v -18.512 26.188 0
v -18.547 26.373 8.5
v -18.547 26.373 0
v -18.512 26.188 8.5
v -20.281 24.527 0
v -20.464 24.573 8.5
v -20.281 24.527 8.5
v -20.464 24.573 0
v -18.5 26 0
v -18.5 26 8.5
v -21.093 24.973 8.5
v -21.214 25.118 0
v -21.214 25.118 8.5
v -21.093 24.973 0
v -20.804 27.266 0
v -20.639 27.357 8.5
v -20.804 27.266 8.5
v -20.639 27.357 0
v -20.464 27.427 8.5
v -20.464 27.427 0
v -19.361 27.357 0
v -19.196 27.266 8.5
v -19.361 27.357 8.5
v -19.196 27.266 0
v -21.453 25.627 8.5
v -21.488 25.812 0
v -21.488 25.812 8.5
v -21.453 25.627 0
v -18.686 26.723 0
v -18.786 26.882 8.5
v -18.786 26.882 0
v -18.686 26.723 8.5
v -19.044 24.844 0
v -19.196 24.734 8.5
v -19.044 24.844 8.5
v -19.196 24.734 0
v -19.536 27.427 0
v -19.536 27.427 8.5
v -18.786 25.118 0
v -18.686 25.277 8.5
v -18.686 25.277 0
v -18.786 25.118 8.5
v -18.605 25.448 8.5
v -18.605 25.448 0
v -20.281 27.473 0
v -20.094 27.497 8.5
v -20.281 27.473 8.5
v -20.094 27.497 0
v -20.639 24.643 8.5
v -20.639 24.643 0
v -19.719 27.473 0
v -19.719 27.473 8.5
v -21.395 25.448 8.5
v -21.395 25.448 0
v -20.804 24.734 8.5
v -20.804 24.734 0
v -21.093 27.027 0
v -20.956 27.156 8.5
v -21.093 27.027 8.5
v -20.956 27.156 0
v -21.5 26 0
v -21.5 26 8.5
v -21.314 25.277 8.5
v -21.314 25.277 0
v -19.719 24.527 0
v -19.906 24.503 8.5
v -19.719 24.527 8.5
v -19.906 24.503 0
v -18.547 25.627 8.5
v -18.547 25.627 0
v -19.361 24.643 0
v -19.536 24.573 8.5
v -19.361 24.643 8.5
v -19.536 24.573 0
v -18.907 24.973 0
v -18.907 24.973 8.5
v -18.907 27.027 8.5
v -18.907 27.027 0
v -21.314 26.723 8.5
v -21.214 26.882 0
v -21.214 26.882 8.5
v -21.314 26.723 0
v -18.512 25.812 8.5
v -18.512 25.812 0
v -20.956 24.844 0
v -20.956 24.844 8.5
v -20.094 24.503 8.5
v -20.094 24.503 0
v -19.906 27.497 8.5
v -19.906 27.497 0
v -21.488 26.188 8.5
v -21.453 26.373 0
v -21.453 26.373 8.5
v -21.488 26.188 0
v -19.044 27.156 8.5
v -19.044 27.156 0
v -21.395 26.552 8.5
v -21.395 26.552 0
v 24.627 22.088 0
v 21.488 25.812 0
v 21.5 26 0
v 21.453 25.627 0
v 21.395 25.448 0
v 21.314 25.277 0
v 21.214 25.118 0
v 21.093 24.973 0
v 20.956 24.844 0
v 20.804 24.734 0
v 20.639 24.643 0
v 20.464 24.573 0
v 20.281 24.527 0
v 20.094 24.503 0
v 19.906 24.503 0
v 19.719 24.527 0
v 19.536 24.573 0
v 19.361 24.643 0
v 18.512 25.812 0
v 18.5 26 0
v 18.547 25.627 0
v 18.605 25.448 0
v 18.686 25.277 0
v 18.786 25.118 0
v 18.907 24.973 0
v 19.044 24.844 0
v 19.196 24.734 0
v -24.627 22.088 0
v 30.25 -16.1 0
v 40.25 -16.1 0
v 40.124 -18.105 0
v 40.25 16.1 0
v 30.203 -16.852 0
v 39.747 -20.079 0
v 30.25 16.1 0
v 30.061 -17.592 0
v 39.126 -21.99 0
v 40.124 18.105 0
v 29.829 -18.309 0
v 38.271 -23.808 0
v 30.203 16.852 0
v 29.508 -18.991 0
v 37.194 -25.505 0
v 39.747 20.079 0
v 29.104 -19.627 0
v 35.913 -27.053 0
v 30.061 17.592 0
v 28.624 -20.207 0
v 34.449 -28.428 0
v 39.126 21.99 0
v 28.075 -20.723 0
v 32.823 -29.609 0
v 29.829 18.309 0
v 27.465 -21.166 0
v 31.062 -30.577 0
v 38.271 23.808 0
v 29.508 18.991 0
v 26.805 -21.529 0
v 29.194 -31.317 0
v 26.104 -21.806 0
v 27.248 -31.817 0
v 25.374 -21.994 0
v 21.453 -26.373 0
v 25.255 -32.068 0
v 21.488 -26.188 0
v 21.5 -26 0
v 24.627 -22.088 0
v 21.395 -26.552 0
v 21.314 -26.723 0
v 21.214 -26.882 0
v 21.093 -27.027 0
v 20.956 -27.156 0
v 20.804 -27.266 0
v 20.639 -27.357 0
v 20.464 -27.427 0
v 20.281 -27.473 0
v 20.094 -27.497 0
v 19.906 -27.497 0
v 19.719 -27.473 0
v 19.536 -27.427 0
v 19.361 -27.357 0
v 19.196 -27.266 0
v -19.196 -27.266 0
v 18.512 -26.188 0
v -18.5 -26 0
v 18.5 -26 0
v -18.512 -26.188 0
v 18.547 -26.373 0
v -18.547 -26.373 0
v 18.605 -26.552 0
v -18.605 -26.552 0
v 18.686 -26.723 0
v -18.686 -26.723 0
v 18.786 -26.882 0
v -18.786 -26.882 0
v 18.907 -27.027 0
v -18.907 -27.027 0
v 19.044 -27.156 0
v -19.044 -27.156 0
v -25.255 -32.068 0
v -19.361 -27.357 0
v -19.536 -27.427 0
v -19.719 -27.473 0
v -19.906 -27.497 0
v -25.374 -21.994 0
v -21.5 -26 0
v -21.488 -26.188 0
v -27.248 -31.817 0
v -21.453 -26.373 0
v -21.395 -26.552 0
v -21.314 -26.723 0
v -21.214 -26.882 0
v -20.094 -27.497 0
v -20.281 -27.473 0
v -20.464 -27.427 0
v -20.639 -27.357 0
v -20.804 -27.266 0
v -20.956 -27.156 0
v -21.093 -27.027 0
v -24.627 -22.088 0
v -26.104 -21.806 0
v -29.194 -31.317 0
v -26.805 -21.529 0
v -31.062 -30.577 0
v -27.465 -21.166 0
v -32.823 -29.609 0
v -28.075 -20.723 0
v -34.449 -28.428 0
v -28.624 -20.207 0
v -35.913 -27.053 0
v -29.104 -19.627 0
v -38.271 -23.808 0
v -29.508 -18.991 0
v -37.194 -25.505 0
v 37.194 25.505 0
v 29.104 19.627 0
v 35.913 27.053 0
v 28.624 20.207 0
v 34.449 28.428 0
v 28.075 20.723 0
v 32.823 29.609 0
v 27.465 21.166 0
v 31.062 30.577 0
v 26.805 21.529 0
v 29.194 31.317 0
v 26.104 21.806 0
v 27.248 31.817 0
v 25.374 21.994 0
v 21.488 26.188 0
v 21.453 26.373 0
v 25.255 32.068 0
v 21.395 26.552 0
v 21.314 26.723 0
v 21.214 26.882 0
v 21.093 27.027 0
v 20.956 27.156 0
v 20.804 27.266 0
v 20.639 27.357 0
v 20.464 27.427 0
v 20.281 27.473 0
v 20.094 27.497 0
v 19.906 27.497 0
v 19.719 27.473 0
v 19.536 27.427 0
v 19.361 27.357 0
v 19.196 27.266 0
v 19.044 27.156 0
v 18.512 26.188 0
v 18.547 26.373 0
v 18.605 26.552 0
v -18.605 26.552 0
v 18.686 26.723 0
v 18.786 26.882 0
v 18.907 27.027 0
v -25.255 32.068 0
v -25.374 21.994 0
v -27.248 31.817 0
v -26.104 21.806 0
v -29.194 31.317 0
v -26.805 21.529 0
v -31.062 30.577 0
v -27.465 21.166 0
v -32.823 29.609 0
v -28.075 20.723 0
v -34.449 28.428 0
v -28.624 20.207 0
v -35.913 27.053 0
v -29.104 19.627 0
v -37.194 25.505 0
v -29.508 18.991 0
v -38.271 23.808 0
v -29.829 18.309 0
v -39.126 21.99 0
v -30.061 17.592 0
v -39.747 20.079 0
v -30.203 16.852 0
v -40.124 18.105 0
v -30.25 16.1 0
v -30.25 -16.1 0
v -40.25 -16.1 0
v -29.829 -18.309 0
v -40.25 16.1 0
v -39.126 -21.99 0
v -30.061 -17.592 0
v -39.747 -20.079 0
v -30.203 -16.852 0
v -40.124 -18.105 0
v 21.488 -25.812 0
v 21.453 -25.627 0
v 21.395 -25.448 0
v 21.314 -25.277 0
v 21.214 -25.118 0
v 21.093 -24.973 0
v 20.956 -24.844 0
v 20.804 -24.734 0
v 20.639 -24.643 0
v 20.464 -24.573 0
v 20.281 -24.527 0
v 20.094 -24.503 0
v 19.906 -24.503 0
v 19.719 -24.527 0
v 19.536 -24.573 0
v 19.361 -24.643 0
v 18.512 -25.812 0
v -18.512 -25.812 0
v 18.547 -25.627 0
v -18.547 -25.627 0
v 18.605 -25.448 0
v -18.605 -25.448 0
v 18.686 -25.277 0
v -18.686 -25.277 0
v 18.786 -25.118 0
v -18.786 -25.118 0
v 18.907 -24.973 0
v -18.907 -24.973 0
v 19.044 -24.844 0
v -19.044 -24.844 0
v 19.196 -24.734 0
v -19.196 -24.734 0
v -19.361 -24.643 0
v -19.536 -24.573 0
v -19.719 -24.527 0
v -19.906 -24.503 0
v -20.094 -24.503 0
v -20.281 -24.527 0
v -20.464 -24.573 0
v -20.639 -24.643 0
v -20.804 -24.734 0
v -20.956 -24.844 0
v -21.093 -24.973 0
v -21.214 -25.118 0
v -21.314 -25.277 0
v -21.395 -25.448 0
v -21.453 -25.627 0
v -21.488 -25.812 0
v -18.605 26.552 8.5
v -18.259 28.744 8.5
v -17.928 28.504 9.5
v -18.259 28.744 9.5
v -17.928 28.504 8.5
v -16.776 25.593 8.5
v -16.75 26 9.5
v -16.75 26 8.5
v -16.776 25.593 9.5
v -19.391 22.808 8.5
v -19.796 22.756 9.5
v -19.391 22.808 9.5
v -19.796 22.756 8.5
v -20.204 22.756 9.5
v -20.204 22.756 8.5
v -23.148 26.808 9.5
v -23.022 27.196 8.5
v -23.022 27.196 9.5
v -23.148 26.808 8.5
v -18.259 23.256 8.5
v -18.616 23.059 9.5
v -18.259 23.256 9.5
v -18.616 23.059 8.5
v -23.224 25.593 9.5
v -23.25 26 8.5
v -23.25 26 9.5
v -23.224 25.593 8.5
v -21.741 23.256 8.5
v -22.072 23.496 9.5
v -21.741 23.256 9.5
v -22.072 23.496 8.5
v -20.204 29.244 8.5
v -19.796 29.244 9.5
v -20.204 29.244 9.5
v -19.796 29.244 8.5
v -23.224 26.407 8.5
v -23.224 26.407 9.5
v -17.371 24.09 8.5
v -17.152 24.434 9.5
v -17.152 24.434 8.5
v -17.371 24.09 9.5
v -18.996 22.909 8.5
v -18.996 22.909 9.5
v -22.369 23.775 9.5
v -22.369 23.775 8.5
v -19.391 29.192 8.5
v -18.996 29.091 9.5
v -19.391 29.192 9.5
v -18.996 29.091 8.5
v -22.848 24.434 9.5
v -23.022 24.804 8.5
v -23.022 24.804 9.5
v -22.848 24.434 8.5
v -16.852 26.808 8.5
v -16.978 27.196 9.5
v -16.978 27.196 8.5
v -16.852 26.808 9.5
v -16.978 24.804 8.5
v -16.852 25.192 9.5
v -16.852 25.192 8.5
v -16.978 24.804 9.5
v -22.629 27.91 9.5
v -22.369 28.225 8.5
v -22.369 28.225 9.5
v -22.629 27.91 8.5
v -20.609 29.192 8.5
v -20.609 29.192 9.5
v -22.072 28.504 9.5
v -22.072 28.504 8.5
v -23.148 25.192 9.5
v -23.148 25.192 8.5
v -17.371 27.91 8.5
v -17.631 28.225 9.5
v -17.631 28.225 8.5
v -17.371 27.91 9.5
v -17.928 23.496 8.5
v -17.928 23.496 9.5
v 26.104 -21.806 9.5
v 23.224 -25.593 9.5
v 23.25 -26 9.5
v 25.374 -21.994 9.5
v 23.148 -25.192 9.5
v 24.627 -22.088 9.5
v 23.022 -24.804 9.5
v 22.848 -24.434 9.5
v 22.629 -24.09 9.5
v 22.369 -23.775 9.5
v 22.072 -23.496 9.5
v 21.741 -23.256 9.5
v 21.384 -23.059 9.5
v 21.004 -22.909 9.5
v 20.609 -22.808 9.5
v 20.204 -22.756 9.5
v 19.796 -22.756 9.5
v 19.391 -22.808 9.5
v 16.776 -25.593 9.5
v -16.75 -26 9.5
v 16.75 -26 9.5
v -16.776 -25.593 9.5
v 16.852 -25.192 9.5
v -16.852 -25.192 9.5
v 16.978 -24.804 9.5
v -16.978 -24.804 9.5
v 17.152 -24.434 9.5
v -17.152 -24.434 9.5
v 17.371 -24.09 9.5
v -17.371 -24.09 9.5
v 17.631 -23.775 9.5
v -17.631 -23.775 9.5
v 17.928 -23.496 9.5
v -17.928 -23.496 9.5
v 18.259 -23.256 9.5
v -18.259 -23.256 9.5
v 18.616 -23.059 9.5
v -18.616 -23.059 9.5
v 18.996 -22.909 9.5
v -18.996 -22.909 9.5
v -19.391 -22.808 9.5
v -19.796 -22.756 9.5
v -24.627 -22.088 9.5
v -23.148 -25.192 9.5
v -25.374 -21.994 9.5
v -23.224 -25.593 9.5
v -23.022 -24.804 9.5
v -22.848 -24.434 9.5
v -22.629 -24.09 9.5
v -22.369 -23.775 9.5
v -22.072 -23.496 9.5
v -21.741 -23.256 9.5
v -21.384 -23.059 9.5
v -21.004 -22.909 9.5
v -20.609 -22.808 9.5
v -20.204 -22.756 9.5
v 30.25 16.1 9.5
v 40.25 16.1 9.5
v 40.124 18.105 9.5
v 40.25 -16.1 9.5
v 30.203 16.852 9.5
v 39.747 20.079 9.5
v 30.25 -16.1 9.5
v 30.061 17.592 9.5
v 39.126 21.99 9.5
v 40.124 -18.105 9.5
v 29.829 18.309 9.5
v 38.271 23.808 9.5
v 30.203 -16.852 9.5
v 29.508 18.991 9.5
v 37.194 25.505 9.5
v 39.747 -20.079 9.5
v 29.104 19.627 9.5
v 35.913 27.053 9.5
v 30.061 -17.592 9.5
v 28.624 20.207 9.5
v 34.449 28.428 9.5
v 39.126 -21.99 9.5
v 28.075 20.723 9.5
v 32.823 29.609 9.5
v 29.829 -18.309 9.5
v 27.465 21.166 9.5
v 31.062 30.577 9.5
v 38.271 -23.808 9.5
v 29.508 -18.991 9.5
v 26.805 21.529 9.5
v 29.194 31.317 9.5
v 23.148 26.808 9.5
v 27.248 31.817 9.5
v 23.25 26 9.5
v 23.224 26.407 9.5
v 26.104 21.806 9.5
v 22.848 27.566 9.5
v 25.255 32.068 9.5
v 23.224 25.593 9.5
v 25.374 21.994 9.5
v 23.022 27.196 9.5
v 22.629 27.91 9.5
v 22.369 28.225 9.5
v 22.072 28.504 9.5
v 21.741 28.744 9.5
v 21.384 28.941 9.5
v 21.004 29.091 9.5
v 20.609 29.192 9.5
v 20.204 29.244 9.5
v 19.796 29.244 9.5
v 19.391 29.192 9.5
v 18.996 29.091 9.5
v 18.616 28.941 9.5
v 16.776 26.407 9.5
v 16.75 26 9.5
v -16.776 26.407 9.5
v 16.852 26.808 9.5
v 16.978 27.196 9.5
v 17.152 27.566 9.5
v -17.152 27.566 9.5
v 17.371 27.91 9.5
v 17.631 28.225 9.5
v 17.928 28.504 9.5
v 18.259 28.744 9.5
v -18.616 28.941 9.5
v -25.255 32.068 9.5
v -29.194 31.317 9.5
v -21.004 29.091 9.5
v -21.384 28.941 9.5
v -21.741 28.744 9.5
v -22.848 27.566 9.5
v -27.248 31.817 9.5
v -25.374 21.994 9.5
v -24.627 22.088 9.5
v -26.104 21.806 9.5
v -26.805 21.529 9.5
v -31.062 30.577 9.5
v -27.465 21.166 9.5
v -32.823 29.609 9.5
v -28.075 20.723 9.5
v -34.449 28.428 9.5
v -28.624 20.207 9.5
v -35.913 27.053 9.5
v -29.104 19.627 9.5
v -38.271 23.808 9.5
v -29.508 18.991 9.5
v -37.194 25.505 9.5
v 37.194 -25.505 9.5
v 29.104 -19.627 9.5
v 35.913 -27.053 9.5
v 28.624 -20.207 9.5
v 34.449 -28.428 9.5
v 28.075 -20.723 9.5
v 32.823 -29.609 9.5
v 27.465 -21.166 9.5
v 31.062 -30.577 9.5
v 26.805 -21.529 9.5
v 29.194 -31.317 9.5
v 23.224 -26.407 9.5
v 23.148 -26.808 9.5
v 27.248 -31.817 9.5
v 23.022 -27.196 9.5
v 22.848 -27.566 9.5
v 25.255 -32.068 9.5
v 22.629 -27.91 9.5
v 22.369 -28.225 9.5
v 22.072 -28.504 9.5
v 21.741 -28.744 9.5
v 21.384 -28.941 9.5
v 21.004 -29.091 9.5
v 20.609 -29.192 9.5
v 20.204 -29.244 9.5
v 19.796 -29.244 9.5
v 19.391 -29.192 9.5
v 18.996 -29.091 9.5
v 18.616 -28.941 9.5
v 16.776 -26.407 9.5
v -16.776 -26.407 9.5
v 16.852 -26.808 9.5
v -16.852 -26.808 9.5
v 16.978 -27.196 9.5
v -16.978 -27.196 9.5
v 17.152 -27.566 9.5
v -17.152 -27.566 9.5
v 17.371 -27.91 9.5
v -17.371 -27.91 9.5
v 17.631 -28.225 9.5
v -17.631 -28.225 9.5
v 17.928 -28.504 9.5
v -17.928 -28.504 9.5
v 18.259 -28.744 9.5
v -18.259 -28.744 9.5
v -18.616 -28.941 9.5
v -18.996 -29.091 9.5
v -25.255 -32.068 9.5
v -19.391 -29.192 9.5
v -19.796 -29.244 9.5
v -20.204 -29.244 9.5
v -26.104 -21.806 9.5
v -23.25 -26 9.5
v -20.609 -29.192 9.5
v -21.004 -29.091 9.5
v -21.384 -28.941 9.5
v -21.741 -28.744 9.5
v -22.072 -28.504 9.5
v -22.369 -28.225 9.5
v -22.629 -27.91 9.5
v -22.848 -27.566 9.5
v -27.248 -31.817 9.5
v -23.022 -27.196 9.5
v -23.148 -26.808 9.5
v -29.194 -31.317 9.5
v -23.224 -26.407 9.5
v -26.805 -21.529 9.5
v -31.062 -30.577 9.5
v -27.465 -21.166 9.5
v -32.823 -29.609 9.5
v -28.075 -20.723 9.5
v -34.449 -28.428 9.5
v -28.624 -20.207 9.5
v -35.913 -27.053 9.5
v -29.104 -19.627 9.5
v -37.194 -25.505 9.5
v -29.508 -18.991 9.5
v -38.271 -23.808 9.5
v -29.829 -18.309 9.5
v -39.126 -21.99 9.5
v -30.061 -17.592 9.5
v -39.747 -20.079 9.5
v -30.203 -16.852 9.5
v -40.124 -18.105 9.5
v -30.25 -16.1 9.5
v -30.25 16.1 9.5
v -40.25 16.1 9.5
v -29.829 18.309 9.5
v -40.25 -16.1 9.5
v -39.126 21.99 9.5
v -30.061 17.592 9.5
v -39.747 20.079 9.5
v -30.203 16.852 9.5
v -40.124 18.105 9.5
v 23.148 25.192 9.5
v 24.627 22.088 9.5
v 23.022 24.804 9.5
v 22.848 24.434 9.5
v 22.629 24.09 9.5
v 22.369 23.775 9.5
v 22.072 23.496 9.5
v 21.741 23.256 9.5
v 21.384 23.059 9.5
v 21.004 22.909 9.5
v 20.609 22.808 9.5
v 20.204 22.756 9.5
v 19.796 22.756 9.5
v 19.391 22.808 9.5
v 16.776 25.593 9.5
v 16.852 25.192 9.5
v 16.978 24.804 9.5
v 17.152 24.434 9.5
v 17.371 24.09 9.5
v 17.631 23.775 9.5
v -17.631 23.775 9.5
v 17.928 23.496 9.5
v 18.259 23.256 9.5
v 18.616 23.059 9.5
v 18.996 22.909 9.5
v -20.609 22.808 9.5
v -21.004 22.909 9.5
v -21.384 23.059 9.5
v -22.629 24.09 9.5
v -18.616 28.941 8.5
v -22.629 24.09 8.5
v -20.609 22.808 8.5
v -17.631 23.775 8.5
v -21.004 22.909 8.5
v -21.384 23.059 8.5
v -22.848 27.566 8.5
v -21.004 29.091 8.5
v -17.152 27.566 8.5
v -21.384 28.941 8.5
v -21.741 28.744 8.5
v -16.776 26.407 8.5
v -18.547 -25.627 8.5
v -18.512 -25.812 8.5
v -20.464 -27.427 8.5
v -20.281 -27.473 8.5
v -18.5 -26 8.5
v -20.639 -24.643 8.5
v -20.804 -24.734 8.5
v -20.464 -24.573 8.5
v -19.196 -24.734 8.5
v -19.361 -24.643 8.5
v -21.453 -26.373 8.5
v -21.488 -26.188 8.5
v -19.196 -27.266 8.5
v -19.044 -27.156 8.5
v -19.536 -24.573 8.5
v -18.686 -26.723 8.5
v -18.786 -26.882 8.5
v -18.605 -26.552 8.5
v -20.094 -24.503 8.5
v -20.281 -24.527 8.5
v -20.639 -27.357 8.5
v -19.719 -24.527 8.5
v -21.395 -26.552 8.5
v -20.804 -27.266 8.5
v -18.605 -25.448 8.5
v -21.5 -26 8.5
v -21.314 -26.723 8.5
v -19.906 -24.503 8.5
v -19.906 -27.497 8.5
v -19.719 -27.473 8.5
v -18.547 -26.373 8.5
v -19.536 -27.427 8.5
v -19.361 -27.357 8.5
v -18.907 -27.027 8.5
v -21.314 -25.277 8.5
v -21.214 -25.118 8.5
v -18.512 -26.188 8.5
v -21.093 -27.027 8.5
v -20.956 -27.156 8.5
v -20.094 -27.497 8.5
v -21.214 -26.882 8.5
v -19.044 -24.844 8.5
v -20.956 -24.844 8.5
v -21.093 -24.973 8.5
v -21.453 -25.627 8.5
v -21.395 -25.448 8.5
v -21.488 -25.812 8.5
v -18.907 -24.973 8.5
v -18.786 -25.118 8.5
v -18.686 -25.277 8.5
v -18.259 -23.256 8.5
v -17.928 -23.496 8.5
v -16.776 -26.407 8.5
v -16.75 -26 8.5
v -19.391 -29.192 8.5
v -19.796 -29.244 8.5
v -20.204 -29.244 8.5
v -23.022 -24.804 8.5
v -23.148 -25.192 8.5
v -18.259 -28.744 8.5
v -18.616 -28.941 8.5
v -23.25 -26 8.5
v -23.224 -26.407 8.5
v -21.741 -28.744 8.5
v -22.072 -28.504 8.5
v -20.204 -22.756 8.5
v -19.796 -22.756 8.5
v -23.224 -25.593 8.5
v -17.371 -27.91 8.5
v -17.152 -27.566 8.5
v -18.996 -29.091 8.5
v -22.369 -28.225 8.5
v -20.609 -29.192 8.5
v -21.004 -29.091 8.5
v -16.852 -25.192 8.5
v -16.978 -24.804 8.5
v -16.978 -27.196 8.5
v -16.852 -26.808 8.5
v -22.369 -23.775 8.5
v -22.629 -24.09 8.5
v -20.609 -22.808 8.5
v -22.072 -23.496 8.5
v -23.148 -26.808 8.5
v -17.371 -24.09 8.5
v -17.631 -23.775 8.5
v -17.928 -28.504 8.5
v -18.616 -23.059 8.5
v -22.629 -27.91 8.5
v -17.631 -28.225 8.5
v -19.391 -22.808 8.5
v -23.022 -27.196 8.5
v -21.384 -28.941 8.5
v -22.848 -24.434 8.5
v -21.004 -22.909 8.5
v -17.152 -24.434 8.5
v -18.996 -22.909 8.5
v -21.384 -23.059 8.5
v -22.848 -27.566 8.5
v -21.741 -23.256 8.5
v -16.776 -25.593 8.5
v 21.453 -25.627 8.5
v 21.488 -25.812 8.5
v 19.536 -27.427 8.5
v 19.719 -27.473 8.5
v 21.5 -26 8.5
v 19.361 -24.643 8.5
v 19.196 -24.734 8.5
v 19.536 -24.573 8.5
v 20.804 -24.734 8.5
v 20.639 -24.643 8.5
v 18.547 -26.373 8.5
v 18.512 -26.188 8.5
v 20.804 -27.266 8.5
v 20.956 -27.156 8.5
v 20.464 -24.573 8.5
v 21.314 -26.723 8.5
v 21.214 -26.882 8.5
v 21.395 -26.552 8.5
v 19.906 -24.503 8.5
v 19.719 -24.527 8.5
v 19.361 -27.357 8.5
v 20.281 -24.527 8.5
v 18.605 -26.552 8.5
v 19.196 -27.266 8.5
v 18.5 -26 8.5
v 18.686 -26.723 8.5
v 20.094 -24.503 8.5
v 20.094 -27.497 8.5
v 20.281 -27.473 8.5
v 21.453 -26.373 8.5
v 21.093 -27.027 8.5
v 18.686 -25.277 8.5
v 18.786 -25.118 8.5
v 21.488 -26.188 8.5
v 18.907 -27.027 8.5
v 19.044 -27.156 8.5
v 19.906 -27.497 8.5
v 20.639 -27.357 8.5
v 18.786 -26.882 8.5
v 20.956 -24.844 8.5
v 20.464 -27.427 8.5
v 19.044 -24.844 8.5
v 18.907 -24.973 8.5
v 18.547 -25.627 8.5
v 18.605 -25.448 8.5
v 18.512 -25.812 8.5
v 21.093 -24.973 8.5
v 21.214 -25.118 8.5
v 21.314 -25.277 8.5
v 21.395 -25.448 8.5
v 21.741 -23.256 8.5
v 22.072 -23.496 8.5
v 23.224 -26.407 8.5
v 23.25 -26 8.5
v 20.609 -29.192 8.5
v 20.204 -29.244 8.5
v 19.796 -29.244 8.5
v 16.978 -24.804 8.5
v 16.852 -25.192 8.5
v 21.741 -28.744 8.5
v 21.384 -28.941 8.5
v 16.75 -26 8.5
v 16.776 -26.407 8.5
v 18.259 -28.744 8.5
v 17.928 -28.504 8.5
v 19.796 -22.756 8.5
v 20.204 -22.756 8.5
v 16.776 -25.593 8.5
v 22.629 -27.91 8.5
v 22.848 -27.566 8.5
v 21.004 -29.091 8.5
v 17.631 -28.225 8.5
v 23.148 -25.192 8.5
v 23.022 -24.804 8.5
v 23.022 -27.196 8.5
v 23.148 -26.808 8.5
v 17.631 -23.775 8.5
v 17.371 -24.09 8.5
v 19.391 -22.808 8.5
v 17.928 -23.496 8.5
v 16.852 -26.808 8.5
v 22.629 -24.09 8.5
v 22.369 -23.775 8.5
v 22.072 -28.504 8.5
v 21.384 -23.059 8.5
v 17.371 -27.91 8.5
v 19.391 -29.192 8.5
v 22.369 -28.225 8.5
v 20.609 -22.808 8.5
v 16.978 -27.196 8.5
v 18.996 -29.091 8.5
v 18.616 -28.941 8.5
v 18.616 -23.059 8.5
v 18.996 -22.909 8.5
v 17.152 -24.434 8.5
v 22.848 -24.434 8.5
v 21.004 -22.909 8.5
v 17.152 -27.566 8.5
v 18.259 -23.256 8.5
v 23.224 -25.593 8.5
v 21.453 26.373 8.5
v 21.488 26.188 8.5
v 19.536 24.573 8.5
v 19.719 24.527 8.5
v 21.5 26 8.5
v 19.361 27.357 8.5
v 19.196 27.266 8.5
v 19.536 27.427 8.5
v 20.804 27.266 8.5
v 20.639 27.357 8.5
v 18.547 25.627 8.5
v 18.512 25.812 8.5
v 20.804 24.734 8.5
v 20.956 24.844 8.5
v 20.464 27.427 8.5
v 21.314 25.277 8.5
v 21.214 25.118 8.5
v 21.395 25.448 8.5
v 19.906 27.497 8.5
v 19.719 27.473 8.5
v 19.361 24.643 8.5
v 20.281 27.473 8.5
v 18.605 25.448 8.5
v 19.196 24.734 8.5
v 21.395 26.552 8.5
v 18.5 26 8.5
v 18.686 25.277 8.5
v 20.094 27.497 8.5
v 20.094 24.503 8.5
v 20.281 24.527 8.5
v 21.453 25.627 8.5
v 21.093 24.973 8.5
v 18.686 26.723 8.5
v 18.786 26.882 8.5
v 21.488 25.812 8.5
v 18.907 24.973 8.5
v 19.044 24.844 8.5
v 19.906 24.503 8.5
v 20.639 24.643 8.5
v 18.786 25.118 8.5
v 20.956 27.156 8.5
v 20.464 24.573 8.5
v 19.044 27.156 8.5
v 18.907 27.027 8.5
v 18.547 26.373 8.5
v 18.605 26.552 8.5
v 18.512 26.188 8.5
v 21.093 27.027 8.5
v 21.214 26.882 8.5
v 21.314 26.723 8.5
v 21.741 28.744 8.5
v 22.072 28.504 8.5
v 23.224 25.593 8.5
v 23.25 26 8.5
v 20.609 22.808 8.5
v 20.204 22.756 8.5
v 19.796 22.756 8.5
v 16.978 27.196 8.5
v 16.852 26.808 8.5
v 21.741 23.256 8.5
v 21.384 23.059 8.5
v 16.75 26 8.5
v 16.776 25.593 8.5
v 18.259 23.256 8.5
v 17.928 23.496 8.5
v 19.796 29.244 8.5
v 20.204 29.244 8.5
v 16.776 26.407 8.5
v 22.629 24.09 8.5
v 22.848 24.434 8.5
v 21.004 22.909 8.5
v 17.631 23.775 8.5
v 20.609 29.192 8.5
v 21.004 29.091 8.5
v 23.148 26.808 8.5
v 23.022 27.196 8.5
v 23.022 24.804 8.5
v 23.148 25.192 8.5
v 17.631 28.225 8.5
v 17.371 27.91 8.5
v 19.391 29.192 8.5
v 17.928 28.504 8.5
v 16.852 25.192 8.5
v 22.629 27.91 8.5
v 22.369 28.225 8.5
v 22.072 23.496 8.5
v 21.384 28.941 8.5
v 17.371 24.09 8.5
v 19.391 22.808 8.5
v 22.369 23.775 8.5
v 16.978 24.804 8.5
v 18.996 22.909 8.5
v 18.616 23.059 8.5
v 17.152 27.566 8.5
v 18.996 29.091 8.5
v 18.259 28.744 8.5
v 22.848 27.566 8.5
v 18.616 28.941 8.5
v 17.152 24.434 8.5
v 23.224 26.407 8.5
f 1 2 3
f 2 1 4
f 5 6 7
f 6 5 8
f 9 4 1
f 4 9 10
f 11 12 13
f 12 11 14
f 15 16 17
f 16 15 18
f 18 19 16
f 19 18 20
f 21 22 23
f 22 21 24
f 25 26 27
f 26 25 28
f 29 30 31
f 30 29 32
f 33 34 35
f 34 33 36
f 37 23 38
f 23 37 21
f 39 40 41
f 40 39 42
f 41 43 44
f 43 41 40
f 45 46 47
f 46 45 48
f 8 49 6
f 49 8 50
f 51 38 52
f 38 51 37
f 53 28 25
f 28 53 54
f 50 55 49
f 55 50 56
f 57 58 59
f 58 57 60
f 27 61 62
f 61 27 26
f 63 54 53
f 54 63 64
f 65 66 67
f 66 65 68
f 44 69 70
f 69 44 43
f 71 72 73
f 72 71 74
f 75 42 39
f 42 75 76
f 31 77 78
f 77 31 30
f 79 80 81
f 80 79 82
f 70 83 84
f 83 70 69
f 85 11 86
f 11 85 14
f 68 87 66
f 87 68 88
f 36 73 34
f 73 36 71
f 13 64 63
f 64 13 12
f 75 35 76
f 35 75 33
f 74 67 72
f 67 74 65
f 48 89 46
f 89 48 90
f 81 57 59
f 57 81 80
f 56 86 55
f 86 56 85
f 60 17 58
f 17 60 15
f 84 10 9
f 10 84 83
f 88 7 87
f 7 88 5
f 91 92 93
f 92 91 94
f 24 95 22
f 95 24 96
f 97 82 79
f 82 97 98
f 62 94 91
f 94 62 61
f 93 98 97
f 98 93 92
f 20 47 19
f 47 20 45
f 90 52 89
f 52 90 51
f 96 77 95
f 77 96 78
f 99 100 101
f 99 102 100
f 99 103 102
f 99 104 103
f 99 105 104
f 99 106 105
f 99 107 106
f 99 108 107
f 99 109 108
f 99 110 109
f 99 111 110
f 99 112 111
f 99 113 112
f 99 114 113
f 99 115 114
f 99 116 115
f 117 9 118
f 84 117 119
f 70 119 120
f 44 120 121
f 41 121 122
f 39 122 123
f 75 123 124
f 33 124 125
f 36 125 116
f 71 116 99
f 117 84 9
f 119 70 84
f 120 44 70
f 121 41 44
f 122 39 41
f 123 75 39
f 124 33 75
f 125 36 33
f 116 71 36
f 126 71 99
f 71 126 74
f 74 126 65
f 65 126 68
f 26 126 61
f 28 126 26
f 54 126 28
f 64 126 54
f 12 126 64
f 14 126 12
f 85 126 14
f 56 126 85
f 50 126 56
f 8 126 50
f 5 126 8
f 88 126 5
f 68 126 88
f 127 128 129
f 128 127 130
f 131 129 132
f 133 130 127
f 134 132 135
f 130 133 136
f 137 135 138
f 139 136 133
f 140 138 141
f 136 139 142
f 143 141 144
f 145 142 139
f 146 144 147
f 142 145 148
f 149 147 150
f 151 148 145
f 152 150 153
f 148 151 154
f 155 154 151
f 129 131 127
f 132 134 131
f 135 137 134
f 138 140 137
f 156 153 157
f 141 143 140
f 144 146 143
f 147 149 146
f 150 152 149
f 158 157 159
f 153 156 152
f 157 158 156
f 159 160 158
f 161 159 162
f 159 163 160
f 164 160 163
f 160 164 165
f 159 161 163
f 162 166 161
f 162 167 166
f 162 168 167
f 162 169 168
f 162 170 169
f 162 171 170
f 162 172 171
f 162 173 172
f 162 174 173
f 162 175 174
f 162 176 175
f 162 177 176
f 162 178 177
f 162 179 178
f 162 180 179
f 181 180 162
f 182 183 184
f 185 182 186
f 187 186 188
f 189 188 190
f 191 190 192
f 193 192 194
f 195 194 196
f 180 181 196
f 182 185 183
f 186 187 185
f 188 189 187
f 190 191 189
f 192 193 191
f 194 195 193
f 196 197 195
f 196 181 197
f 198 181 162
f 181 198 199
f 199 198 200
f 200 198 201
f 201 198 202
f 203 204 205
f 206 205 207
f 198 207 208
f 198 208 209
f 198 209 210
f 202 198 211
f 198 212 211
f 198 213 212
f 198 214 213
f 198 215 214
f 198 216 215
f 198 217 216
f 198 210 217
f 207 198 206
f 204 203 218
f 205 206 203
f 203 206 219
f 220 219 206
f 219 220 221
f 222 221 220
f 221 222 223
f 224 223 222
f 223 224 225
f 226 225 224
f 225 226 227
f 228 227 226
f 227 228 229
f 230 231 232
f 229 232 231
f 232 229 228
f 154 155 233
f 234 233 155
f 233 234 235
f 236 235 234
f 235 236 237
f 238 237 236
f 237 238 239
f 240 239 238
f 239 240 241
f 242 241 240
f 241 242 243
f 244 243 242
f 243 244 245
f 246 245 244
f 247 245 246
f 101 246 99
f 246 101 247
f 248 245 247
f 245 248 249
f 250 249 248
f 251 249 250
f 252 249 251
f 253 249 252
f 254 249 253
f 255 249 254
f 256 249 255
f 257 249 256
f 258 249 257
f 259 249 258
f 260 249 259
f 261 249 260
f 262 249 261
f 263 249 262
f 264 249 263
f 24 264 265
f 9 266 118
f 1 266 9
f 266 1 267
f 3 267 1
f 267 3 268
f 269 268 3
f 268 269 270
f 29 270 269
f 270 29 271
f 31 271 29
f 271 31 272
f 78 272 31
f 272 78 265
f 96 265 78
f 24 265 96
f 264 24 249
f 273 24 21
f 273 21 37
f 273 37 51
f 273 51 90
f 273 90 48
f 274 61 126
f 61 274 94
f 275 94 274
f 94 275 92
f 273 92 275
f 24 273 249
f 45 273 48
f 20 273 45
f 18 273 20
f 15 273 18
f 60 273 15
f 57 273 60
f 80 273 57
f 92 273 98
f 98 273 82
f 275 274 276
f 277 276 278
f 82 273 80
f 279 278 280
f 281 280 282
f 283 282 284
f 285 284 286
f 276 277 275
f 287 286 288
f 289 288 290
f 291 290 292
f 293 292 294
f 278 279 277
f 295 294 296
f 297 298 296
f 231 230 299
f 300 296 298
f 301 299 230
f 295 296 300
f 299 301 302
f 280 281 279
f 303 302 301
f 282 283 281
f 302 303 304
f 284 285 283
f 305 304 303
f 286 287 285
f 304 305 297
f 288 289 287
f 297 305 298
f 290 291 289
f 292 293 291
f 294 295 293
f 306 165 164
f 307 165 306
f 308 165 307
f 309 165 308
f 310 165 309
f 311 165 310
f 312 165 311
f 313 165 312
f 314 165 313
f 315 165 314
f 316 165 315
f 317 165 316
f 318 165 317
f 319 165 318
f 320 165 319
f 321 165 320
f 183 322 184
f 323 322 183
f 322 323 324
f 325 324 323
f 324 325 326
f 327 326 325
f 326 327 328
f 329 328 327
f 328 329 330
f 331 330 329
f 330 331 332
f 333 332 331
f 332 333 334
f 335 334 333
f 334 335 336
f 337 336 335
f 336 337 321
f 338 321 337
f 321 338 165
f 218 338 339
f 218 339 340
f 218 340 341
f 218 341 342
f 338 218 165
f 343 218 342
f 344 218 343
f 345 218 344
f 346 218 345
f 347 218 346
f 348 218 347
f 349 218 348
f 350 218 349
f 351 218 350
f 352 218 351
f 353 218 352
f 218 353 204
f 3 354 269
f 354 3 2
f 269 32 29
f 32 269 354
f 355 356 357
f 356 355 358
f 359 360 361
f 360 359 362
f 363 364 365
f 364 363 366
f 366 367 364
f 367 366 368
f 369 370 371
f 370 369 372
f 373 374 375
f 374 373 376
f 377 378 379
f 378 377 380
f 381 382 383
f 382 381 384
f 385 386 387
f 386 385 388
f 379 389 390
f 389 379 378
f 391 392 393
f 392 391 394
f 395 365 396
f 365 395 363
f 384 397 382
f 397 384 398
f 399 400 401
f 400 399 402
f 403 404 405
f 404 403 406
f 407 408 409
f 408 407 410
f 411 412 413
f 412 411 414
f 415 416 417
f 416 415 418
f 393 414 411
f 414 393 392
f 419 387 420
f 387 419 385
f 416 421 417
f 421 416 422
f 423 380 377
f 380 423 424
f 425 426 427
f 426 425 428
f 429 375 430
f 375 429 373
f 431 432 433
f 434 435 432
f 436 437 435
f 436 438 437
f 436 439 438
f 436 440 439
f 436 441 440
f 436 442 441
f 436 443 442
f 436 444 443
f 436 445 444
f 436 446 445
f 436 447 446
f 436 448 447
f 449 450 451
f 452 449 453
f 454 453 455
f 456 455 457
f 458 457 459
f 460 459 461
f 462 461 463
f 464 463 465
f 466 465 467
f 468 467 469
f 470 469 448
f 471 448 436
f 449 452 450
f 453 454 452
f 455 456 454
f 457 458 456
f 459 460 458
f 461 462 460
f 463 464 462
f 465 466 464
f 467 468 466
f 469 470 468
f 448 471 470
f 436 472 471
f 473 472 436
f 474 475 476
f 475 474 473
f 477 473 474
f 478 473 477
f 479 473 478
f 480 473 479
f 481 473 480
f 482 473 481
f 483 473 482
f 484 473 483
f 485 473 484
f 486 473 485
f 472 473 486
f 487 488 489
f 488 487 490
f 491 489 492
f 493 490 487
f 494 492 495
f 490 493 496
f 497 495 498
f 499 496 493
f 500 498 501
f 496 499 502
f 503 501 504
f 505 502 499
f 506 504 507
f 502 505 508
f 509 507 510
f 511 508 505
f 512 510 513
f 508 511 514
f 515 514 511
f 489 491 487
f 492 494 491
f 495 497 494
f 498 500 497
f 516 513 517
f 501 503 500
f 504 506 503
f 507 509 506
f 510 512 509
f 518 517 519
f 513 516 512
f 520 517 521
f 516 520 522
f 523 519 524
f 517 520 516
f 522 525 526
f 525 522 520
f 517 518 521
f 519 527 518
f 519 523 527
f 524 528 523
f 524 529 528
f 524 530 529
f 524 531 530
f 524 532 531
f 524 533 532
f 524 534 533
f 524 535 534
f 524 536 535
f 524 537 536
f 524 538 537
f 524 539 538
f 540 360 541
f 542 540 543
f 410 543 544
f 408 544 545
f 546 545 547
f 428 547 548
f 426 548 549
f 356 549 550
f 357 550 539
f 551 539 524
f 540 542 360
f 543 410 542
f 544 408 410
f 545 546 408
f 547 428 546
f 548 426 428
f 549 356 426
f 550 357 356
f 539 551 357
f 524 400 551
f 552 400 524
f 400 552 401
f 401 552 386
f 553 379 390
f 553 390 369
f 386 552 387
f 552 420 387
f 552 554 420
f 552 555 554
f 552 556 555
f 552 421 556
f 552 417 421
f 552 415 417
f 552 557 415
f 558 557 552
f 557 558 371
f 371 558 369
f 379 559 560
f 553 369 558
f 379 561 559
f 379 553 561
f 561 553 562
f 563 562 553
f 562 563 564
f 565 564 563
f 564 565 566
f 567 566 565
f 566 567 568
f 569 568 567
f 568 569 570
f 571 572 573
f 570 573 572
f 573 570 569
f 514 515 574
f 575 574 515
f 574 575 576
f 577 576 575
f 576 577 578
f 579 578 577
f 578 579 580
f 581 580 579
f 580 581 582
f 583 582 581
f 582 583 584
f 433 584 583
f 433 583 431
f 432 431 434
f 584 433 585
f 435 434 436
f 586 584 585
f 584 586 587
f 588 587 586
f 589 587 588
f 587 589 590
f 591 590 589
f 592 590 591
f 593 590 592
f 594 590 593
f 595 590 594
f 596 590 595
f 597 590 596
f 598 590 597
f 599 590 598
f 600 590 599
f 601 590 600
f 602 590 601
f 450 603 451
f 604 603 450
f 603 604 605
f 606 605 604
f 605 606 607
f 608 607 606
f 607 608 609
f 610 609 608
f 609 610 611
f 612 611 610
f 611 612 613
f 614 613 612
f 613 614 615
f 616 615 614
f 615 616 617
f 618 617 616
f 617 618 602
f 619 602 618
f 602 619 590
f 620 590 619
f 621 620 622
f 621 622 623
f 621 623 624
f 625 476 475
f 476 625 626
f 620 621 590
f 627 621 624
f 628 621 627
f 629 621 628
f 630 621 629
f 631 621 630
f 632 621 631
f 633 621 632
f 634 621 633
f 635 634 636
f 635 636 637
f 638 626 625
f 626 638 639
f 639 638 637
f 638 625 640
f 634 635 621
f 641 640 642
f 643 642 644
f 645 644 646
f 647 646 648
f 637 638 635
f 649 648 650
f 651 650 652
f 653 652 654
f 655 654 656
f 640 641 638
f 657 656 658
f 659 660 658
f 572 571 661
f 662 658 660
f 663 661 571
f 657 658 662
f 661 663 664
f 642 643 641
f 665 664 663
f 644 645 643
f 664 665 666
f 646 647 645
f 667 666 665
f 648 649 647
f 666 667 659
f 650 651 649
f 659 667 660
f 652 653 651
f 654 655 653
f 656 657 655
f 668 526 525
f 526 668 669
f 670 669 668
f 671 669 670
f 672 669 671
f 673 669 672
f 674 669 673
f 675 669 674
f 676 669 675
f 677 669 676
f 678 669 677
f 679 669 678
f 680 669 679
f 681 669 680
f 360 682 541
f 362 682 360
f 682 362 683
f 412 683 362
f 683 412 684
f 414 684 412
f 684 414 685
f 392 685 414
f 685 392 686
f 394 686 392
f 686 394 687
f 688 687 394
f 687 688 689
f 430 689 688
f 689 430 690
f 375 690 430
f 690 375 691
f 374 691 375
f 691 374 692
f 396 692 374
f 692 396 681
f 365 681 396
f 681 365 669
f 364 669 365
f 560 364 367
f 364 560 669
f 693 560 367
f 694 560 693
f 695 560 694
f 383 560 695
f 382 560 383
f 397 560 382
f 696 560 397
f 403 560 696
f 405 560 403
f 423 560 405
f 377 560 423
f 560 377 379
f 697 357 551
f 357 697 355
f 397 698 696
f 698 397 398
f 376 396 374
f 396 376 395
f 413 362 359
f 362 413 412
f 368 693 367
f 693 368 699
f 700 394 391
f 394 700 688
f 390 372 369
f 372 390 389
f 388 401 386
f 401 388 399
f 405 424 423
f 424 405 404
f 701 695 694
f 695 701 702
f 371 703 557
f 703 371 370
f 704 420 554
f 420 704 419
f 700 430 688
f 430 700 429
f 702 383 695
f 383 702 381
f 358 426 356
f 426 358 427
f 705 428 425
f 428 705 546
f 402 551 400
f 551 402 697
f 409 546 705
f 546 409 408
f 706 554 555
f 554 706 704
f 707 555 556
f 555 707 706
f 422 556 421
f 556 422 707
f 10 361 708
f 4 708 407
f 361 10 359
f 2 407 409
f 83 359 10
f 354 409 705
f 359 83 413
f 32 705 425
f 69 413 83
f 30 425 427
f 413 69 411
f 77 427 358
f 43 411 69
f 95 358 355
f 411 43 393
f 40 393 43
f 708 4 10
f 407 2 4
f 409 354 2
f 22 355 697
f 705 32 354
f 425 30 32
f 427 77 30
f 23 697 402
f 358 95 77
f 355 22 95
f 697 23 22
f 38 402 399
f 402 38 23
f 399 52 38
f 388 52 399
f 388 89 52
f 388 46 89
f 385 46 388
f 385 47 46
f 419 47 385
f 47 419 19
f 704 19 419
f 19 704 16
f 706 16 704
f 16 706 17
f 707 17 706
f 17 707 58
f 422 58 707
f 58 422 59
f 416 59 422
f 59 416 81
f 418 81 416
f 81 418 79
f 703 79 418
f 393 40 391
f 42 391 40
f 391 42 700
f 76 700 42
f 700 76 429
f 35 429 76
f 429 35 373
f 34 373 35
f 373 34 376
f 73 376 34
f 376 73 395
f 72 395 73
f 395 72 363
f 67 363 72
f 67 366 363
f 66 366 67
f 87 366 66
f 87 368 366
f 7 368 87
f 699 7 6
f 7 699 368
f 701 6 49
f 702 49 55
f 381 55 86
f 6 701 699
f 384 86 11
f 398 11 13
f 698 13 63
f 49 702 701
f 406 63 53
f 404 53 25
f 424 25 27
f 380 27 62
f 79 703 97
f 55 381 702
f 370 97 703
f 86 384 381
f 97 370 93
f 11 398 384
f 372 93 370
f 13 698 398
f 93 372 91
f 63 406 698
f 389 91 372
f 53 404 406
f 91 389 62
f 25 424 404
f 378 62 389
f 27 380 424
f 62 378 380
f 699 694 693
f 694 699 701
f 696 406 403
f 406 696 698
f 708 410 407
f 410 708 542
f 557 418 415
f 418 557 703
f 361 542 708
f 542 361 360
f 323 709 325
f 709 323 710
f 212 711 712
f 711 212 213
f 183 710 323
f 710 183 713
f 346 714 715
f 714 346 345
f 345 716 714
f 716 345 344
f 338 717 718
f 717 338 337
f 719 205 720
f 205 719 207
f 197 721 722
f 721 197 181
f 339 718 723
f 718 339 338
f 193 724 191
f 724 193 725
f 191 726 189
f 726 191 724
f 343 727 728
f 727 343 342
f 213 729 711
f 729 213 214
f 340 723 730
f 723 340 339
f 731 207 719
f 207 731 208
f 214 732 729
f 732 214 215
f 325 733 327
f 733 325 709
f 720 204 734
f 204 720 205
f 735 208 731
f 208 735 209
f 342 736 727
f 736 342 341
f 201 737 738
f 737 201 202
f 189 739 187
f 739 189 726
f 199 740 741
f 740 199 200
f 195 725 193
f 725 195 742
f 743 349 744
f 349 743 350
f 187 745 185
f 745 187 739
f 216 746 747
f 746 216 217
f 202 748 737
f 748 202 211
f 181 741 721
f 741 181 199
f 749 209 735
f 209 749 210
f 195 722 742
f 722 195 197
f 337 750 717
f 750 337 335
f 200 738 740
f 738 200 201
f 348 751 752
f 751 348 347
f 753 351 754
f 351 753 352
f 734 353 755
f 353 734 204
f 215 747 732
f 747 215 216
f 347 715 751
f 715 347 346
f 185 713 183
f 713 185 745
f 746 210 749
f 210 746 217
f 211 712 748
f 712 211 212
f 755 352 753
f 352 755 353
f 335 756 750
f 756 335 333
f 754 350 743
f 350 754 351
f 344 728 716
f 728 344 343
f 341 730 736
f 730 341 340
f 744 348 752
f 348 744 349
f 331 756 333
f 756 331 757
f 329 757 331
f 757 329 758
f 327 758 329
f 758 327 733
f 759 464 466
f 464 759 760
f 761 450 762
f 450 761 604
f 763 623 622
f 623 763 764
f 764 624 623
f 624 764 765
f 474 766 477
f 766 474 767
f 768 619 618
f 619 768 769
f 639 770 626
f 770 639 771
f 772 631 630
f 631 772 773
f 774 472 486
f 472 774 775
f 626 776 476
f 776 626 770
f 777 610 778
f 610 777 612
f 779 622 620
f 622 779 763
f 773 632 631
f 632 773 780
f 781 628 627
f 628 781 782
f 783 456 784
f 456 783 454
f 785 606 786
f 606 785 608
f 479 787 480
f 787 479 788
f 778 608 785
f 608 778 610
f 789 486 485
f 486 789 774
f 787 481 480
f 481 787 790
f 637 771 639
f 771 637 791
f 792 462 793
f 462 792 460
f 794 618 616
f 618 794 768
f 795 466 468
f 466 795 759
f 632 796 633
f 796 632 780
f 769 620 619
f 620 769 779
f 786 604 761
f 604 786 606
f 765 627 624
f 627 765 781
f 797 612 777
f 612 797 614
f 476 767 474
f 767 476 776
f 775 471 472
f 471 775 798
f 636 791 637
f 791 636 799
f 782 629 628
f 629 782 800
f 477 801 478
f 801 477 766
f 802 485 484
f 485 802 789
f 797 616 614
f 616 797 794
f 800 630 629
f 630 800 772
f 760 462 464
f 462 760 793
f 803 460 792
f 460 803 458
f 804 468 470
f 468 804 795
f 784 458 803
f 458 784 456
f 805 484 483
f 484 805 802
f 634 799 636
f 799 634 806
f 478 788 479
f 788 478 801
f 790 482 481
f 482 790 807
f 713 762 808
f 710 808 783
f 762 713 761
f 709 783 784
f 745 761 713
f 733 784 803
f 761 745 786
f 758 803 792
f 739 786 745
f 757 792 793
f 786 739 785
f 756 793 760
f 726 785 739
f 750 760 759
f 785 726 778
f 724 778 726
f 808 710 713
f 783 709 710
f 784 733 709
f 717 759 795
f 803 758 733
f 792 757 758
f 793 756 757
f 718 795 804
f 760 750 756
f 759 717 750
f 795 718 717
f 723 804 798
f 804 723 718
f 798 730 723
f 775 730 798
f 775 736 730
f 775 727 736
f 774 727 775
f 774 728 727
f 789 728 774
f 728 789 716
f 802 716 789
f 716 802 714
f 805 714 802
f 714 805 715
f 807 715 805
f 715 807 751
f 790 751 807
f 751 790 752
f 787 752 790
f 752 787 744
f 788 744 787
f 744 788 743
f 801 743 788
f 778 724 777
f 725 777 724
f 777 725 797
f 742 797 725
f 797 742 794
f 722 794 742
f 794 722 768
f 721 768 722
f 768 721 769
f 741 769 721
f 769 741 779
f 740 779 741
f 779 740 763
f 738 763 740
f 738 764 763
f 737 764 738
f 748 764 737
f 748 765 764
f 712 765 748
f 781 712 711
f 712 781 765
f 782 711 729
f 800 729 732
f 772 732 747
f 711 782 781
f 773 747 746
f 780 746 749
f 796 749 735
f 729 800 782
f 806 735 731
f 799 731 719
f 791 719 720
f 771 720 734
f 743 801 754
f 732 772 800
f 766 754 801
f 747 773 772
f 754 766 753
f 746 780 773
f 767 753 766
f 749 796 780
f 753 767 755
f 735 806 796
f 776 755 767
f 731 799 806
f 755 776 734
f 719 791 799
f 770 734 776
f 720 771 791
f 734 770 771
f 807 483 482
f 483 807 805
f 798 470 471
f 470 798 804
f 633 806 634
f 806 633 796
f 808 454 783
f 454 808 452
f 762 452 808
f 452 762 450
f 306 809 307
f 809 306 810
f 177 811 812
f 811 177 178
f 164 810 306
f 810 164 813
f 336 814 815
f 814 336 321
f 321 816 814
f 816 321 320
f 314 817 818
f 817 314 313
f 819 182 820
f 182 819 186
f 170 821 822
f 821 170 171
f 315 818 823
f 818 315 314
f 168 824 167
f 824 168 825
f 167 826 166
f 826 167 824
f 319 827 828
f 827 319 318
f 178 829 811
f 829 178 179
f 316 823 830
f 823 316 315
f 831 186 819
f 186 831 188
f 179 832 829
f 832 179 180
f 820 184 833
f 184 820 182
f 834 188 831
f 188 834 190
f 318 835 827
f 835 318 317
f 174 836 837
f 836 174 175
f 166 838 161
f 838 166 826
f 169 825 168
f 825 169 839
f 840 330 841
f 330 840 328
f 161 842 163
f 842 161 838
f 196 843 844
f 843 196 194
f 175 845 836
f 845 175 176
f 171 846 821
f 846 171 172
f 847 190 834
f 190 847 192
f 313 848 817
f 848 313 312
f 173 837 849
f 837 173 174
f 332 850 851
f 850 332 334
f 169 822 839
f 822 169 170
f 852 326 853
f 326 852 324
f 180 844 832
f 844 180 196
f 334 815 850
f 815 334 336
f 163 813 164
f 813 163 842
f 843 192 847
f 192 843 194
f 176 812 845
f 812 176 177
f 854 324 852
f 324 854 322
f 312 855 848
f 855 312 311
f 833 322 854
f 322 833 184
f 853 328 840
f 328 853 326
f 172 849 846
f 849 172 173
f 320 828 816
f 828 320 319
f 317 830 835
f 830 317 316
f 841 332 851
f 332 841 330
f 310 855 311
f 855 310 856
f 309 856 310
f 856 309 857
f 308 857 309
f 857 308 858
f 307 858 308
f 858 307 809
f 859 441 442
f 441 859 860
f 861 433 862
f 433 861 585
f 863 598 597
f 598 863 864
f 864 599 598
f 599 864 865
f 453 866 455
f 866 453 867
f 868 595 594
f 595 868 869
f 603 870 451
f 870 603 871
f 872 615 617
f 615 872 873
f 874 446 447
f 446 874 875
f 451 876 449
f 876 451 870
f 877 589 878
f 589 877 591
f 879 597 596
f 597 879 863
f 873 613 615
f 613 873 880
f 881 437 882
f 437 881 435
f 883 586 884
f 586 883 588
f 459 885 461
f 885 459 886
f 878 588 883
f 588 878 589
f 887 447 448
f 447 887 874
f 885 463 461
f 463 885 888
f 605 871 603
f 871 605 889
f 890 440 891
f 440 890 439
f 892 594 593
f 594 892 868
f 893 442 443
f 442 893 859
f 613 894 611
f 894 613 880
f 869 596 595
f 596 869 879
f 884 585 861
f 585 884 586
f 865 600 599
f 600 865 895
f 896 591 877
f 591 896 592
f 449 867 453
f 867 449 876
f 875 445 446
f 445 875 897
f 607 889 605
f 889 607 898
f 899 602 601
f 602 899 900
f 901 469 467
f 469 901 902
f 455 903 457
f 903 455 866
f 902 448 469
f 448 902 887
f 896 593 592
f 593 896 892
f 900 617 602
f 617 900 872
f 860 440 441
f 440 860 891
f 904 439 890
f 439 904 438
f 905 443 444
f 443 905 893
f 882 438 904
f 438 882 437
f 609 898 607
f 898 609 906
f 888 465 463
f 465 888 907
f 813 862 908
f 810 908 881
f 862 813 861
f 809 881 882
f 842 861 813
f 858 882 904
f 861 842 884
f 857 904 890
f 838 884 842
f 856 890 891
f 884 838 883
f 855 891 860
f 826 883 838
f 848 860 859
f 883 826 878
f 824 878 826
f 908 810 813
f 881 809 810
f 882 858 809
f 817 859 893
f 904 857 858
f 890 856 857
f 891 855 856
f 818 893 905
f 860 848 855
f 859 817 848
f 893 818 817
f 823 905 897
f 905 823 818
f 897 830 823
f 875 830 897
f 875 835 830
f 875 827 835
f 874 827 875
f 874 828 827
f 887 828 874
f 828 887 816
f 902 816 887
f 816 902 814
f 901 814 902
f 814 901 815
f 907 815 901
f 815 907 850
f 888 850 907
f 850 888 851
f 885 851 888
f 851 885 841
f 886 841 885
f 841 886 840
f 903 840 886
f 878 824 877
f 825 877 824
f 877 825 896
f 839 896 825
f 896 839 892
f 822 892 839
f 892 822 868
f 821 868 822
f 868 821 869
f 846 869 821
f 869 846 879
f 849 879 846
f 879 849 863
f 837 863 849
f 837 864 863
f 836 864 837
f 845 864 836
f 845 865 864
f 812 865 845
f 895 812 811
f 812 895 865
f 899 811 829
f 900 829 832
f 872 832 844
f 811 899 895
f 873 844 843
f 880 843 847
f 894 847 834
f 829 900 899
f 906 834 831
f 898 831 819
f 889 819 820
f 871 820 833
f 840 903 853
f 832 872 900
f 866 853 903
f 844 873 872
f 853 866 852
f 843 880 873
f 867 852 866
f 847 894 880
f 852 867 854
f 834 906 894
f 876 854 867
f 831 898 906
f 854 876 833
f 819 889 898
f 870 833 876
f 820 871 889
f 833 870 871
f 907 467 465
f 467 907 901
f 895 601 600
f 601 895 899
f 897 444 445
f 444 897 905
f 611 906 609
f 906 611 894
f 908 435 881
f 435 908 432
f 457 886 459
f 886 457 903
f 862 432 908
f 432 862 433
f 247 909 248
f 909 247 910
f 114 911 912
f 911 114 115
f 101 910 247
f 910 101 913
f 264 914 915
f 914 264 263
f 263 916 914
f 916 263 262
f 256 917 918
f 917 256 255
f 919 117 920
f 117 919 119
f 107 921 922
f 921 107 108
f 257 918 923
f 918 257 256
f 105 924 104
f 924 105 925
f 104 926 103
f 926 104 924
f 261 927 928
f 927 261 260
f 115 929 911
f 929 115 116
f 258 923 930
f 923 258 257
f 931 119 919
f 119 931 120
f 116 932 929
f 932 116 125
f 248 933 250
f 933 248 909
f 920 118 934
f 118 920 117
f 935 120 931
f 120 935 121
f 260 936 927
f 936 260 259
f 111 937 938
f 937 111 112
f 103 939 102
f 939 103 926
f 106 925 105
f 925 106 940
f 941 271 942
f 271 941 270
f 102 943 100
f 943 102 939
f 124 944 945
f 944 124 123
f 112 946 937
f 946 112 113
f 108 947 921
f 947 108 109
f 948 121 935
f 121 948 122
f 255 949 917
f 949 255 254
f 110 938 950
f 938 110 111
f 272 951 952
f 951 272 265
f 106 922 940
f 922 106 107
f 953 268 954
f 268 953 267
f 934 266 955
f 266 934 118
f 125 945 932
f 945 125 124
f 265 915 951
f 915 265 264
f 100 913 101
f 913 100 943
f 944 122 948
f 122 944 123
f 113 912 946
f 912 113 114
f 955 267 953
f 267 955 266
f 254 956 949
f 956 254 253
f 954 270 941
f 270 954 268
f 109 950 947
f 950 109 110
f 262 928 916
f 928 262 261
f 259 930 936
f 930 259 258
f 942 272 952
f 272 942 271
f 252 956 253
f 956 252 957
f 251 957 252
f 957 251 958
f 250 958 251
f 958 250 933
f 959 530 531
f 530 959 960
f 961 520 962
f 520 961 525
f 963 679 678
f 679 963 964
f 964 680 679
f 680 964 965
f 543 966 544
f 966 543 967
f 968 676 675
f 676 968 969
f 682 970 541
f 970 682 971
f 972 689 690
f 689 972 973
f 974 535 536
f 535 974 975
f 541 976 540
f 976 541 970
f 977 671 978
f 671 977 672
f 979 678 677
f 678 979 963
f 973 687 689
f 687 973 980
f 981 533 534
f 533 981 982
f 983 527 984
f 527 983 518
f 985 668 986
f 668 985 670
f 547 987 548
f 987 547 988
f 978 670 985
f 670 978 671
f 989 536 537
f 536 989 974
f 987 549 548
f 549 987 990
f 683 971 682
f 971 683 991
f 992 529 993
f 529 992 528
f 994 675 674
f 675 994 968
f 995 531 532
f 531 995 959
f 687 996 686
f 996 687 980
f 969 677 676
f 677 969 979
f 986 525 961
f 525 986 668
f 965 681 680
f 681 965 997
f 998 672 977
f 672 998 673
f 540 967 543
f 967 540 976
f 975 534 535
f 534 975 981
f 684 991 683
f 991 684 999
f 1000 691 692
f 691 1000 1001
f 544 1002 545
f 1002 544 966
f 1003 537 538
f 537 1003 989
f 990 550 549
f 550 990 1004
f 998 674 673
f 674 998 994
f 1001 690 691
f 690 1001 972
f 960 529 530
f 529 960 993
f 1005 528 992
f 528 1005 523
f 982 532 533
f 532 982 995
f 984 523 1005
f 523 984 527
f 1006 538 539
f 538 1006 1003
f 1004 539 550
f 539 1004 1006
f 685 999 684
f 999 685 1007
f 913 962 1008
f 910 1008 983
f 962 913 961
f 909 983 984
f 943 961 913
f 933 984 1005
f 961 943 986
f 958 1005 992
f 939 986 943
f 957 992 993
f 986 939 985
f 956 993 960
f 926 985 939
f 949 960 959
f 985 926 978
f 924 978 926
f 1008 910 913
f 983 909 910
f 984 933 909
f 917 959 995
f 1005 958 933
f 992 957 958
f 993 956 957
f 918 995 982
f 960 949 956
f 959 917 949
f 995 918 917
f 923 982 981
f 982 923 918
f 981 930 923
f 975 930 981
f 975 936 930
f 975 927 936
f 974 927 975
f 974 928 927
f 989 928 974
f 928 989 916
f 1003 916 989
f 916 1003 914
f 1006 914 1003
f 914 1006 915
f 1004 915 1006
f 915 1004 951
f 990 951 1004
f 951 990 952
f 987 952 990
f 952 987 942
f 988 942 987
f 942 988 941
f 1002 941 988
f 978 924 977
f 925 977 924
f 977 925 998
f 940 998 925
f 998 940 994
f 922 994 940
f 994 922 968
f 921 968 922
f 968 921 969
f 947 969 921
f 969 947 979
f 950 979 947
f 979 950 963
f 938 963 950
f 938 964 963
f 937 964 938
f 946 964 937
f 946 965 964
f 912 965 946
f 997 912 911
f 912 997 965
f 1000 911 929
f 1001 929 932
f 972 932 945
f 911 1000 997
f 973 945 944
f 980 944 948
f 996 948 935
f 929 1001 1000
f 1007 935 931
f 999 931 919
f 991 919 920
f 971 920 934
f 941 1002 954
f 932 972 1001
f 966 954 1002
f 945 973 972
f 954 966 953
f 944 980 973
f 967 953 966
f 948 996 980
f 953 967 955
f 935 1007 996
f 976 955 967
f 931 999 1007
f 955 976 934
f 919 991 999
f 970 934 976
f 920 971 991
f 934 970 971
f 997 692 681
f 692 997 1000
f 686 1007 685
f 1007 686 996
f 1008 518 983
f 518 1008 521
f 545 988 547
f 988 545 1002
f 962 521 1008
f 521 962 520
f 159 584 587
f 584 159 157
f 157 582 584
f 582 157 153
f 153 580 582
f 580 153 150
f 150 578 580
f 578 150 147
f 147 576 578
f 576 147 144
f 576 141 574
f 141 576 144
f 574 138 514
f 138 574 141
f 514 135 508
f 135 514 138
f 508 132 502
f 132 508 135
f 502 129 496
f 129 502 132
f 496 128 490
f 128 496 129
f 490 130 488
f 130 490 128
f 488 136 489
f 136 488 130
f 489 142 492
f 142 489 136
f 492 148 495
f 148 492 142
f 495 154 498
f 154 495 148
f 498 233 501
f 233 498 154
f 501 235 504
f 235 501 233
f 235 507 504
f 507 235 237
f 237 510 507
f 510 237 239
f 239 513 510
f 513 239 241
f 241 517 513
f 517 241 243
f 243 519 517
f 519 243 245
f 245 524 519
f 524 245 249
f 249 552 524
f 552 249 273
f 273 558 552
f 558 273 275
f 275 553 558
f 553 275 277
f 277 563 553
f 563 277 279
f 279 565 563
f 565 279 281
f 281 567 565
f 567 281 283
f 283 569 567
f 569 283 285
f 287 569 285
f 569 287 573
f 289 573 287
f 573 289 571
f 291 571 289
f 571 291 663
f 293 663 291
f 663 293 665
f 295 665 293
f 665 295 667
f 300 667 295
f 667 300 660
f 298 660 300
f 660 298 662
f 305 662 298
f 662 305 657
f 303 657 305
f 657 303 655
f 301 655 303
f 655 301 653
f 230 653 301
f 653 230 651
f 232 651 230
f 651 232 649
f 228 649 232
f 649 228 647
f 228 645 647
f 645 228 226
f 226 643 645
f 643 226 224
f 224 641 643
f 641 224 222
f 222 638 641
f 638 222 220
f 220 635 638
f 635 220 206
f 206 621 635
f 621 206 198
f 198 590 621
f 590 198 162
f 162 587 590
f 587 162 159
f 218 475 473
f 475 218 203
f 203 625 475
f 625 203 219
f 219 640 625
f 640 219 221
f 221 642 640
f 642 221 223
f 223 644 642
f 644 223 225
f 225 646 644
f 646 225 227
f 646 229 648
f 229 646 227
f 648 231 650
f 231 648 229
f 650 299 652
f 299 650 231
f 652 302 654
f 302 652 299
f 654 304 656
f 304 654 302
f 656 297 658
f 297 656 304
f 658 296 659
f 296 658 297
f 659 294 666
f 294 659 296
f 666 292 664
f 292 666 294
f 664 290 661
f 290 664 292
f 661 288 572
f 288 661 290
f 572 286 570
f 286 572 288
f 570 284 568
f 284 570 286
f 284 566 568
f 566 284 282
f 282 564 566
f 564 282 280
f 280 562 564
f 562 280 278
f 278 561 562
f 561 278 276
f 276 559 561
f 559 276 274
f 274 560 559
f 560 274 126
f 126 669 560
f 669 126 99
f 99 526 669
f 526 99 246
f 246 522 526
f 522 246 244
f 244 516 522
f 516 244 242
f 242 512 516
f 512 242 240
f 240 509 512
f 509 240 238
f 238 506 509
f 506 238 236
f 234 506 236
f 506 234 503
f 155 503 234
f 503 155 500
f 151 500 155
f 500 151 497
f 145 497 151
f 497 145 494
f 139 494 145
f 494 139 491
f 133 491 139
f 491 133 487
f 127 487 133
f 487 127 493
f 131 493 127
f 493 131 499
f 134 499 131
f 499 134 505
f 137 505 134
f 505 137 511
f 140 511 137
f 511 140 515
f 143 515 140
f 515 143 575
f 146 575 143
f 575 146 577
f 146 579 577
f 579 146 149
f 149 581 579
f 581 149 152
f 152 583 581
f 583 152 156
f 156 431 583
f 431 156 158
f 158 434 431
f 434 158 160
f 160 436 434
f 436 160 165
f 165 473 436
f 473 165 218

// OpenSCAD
$fn = 50;

circle_d = 12;
dist = (22 - 6.8);
size = [45.3 + dist - circle_d, 29 + dist - circle_d];
height=9.5;

nut_d = 6.5;
screw_d = 3;
nut_height = 1;

difference() {
    linear_extrude(height=height)
    difference() {
        body(size, circle_d+20);
        body(size, circle_d);
    };
    for(i=[[-1,1], [-1, -1], [1, -1], [1, 1]]) {
        translate([i.x * 20, i.y * 26]) {
            linear_extrude(10)
            circle(d=screw_d);
            
            translate([0, 0, height-nut_height])
            linear_extrude(nut_height)
            circle(d=nut_d);
        }
    }
}


module body(size, circle_d) {
    minkowski() {
        circle(d=circle_d);
        square([size.x, size.y], center=true);
    }
}
